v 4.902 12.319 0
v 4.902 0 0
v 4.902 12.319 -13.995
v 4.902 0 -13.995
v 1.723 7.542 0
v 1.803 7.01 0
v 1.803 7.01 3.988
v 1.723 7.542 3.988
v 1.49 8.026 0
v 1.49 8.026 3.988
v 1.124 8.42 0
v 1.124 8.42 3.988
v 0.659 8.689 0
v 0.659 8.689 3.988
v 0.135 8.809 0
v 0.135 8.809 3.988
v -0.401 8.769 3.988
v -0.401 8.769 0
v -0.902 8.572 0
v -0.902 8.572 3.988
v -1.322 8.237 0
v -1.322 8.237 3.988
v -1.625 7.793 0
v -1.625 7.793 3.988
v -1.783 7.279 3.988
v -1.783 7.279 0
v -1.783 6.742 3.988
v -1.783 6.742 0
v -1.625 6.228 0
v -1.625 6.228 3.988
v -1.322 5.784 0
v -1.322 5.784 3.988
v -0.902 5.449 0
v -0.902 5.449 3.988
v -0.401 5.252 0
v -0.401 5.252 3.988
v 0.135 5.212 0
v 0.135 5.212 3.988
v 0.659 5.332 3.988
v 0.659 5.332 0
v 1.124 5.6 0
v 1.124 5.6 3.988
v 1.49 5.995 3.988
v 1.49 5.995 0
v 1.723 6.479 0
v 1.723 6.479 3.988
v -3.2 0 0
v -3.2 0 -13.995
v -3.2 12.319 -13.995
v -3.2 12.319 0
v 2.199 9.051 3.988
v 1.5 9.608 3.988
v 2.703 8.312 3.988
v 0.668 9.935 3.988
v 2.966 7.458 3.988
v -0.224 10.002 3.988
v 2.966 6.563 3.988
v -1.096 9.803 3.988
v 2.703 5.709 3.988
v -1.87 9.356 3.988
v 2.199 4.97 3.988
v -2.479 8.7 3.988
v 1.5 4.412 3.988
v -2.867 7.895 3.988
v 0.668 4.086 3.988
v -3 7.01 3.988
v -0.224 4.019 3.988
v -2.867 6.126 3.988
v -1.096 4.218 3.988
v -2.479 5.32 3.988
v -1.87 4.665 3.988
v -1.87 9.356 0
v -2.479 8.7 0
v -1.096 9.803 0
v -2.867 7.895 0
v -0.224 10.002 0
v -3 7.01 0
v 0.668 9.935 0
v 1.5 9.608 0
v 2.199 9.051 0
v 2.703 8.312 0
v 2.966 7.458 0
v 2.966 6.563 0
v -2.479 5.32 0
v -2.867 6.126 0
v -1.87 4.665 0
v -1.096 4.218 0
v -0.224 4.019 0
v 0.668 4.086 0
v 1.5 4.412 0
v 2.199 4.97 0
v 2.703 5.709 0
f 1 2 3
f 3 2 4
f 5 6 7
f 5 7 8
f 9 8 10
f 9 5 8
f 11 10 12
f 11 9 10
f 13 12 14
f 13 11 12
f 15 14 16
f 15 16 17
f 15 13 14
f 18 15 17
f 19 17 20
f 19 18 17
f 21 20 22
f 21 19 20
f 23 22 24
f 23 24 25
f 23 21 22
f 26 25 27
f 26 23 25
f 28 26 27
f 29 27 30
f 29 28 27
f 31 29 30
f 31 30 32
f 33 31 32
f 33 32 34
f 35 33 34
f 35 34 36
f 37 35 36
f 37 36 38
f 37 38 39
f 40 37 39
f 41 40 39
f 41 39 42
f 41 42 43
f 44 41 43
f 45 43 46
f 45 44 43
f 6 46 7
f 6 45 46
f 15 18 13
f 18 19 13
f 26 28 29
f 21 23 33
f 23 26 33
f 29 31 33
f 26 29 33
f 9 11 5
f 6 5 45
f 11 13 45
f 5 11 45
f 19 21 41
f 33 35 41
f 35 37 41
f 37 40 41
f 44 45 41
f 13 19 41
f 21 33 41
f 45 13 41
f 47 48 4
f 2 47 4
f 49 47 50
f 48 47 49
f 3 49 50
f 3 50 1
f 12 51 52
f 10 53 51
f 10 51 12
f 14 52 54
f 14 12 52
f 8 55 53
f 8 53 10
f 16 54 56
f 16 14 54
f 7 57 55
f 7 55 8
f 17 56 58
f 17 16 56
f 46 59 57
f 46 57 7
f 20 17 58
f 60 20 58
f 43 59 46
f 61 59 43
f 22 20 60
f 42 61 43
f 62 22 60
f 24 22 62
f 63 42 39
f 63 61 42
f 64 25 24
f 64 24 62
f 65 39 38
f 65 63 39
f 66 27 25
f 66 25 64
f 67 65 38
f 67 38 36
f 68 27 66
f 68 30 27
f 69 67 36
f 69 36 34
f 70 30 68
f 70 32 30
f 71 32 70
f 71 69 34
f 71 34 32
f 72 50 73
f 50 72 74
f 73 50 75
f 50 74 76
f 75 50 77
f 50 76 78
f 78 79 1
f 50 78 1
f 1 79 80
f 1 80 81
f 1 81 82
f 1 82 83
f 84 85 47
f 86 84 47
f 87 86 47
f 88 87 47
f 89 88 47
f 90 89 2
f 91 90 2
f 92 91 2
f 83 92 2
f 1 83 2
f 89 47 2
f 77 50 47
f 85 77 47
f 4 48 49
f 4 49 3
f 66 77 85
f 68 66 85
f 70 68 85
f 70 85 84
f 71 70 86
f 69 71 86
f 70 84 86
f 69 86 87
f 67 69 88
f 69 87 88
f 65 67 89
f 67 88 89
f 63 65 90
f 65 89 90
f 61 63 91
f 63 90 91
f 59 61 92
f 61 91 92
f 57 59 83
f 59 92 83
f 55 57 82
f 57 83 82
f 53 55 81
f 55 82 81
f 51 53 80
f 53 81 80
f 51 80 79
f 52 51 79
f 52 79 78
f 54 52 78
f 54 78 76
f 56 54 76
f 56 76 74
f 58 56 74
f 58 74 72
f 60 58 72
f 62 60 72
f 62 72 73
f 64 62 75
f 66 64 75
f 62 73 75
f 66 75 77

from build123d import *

# Parameters (mm, degrees)
SKETCH1_W           = 8.1026
SKETCH1_H           = 13.9954
BOSS_EXTRUDE1_DEPTH = 12.319
SKETCH2_R           = 3
SKETCH2_R_2         = 1.8034
BOSS_EXTRUDE2_DEPTH = 3.9878


with BuildPart() as part:
    # Sketch1 → Boss-Extrude1 (new body)
    with BuildSketch(Plane(origin=(0, 0, 0), x_dir=(1, 0, 0), z_dir=(0, 1, 0))):
        with Locations((0.8509, 6.9977)):
            Rectangle(SKETCH1_W, SKETCH1_H)
    extrude(amount=BOSS_EXTRUDE1_DEPTH)

    # Sketch2 → Boss-Extrude2 (add)
    with BuildSketch(Plane.XY):
        with Locations(Location((0, 7.0104, 0), (0, 0, 180))):
            Circle(SKETCH2_R)
        with Locations((0, 7.0104)):
            Circle(SKETCH2_R_2, mode=Mode.SUBTRACT)
    extrude(amount=BOSS_EXTRUDE2_DEPTH)


solid = part.part
